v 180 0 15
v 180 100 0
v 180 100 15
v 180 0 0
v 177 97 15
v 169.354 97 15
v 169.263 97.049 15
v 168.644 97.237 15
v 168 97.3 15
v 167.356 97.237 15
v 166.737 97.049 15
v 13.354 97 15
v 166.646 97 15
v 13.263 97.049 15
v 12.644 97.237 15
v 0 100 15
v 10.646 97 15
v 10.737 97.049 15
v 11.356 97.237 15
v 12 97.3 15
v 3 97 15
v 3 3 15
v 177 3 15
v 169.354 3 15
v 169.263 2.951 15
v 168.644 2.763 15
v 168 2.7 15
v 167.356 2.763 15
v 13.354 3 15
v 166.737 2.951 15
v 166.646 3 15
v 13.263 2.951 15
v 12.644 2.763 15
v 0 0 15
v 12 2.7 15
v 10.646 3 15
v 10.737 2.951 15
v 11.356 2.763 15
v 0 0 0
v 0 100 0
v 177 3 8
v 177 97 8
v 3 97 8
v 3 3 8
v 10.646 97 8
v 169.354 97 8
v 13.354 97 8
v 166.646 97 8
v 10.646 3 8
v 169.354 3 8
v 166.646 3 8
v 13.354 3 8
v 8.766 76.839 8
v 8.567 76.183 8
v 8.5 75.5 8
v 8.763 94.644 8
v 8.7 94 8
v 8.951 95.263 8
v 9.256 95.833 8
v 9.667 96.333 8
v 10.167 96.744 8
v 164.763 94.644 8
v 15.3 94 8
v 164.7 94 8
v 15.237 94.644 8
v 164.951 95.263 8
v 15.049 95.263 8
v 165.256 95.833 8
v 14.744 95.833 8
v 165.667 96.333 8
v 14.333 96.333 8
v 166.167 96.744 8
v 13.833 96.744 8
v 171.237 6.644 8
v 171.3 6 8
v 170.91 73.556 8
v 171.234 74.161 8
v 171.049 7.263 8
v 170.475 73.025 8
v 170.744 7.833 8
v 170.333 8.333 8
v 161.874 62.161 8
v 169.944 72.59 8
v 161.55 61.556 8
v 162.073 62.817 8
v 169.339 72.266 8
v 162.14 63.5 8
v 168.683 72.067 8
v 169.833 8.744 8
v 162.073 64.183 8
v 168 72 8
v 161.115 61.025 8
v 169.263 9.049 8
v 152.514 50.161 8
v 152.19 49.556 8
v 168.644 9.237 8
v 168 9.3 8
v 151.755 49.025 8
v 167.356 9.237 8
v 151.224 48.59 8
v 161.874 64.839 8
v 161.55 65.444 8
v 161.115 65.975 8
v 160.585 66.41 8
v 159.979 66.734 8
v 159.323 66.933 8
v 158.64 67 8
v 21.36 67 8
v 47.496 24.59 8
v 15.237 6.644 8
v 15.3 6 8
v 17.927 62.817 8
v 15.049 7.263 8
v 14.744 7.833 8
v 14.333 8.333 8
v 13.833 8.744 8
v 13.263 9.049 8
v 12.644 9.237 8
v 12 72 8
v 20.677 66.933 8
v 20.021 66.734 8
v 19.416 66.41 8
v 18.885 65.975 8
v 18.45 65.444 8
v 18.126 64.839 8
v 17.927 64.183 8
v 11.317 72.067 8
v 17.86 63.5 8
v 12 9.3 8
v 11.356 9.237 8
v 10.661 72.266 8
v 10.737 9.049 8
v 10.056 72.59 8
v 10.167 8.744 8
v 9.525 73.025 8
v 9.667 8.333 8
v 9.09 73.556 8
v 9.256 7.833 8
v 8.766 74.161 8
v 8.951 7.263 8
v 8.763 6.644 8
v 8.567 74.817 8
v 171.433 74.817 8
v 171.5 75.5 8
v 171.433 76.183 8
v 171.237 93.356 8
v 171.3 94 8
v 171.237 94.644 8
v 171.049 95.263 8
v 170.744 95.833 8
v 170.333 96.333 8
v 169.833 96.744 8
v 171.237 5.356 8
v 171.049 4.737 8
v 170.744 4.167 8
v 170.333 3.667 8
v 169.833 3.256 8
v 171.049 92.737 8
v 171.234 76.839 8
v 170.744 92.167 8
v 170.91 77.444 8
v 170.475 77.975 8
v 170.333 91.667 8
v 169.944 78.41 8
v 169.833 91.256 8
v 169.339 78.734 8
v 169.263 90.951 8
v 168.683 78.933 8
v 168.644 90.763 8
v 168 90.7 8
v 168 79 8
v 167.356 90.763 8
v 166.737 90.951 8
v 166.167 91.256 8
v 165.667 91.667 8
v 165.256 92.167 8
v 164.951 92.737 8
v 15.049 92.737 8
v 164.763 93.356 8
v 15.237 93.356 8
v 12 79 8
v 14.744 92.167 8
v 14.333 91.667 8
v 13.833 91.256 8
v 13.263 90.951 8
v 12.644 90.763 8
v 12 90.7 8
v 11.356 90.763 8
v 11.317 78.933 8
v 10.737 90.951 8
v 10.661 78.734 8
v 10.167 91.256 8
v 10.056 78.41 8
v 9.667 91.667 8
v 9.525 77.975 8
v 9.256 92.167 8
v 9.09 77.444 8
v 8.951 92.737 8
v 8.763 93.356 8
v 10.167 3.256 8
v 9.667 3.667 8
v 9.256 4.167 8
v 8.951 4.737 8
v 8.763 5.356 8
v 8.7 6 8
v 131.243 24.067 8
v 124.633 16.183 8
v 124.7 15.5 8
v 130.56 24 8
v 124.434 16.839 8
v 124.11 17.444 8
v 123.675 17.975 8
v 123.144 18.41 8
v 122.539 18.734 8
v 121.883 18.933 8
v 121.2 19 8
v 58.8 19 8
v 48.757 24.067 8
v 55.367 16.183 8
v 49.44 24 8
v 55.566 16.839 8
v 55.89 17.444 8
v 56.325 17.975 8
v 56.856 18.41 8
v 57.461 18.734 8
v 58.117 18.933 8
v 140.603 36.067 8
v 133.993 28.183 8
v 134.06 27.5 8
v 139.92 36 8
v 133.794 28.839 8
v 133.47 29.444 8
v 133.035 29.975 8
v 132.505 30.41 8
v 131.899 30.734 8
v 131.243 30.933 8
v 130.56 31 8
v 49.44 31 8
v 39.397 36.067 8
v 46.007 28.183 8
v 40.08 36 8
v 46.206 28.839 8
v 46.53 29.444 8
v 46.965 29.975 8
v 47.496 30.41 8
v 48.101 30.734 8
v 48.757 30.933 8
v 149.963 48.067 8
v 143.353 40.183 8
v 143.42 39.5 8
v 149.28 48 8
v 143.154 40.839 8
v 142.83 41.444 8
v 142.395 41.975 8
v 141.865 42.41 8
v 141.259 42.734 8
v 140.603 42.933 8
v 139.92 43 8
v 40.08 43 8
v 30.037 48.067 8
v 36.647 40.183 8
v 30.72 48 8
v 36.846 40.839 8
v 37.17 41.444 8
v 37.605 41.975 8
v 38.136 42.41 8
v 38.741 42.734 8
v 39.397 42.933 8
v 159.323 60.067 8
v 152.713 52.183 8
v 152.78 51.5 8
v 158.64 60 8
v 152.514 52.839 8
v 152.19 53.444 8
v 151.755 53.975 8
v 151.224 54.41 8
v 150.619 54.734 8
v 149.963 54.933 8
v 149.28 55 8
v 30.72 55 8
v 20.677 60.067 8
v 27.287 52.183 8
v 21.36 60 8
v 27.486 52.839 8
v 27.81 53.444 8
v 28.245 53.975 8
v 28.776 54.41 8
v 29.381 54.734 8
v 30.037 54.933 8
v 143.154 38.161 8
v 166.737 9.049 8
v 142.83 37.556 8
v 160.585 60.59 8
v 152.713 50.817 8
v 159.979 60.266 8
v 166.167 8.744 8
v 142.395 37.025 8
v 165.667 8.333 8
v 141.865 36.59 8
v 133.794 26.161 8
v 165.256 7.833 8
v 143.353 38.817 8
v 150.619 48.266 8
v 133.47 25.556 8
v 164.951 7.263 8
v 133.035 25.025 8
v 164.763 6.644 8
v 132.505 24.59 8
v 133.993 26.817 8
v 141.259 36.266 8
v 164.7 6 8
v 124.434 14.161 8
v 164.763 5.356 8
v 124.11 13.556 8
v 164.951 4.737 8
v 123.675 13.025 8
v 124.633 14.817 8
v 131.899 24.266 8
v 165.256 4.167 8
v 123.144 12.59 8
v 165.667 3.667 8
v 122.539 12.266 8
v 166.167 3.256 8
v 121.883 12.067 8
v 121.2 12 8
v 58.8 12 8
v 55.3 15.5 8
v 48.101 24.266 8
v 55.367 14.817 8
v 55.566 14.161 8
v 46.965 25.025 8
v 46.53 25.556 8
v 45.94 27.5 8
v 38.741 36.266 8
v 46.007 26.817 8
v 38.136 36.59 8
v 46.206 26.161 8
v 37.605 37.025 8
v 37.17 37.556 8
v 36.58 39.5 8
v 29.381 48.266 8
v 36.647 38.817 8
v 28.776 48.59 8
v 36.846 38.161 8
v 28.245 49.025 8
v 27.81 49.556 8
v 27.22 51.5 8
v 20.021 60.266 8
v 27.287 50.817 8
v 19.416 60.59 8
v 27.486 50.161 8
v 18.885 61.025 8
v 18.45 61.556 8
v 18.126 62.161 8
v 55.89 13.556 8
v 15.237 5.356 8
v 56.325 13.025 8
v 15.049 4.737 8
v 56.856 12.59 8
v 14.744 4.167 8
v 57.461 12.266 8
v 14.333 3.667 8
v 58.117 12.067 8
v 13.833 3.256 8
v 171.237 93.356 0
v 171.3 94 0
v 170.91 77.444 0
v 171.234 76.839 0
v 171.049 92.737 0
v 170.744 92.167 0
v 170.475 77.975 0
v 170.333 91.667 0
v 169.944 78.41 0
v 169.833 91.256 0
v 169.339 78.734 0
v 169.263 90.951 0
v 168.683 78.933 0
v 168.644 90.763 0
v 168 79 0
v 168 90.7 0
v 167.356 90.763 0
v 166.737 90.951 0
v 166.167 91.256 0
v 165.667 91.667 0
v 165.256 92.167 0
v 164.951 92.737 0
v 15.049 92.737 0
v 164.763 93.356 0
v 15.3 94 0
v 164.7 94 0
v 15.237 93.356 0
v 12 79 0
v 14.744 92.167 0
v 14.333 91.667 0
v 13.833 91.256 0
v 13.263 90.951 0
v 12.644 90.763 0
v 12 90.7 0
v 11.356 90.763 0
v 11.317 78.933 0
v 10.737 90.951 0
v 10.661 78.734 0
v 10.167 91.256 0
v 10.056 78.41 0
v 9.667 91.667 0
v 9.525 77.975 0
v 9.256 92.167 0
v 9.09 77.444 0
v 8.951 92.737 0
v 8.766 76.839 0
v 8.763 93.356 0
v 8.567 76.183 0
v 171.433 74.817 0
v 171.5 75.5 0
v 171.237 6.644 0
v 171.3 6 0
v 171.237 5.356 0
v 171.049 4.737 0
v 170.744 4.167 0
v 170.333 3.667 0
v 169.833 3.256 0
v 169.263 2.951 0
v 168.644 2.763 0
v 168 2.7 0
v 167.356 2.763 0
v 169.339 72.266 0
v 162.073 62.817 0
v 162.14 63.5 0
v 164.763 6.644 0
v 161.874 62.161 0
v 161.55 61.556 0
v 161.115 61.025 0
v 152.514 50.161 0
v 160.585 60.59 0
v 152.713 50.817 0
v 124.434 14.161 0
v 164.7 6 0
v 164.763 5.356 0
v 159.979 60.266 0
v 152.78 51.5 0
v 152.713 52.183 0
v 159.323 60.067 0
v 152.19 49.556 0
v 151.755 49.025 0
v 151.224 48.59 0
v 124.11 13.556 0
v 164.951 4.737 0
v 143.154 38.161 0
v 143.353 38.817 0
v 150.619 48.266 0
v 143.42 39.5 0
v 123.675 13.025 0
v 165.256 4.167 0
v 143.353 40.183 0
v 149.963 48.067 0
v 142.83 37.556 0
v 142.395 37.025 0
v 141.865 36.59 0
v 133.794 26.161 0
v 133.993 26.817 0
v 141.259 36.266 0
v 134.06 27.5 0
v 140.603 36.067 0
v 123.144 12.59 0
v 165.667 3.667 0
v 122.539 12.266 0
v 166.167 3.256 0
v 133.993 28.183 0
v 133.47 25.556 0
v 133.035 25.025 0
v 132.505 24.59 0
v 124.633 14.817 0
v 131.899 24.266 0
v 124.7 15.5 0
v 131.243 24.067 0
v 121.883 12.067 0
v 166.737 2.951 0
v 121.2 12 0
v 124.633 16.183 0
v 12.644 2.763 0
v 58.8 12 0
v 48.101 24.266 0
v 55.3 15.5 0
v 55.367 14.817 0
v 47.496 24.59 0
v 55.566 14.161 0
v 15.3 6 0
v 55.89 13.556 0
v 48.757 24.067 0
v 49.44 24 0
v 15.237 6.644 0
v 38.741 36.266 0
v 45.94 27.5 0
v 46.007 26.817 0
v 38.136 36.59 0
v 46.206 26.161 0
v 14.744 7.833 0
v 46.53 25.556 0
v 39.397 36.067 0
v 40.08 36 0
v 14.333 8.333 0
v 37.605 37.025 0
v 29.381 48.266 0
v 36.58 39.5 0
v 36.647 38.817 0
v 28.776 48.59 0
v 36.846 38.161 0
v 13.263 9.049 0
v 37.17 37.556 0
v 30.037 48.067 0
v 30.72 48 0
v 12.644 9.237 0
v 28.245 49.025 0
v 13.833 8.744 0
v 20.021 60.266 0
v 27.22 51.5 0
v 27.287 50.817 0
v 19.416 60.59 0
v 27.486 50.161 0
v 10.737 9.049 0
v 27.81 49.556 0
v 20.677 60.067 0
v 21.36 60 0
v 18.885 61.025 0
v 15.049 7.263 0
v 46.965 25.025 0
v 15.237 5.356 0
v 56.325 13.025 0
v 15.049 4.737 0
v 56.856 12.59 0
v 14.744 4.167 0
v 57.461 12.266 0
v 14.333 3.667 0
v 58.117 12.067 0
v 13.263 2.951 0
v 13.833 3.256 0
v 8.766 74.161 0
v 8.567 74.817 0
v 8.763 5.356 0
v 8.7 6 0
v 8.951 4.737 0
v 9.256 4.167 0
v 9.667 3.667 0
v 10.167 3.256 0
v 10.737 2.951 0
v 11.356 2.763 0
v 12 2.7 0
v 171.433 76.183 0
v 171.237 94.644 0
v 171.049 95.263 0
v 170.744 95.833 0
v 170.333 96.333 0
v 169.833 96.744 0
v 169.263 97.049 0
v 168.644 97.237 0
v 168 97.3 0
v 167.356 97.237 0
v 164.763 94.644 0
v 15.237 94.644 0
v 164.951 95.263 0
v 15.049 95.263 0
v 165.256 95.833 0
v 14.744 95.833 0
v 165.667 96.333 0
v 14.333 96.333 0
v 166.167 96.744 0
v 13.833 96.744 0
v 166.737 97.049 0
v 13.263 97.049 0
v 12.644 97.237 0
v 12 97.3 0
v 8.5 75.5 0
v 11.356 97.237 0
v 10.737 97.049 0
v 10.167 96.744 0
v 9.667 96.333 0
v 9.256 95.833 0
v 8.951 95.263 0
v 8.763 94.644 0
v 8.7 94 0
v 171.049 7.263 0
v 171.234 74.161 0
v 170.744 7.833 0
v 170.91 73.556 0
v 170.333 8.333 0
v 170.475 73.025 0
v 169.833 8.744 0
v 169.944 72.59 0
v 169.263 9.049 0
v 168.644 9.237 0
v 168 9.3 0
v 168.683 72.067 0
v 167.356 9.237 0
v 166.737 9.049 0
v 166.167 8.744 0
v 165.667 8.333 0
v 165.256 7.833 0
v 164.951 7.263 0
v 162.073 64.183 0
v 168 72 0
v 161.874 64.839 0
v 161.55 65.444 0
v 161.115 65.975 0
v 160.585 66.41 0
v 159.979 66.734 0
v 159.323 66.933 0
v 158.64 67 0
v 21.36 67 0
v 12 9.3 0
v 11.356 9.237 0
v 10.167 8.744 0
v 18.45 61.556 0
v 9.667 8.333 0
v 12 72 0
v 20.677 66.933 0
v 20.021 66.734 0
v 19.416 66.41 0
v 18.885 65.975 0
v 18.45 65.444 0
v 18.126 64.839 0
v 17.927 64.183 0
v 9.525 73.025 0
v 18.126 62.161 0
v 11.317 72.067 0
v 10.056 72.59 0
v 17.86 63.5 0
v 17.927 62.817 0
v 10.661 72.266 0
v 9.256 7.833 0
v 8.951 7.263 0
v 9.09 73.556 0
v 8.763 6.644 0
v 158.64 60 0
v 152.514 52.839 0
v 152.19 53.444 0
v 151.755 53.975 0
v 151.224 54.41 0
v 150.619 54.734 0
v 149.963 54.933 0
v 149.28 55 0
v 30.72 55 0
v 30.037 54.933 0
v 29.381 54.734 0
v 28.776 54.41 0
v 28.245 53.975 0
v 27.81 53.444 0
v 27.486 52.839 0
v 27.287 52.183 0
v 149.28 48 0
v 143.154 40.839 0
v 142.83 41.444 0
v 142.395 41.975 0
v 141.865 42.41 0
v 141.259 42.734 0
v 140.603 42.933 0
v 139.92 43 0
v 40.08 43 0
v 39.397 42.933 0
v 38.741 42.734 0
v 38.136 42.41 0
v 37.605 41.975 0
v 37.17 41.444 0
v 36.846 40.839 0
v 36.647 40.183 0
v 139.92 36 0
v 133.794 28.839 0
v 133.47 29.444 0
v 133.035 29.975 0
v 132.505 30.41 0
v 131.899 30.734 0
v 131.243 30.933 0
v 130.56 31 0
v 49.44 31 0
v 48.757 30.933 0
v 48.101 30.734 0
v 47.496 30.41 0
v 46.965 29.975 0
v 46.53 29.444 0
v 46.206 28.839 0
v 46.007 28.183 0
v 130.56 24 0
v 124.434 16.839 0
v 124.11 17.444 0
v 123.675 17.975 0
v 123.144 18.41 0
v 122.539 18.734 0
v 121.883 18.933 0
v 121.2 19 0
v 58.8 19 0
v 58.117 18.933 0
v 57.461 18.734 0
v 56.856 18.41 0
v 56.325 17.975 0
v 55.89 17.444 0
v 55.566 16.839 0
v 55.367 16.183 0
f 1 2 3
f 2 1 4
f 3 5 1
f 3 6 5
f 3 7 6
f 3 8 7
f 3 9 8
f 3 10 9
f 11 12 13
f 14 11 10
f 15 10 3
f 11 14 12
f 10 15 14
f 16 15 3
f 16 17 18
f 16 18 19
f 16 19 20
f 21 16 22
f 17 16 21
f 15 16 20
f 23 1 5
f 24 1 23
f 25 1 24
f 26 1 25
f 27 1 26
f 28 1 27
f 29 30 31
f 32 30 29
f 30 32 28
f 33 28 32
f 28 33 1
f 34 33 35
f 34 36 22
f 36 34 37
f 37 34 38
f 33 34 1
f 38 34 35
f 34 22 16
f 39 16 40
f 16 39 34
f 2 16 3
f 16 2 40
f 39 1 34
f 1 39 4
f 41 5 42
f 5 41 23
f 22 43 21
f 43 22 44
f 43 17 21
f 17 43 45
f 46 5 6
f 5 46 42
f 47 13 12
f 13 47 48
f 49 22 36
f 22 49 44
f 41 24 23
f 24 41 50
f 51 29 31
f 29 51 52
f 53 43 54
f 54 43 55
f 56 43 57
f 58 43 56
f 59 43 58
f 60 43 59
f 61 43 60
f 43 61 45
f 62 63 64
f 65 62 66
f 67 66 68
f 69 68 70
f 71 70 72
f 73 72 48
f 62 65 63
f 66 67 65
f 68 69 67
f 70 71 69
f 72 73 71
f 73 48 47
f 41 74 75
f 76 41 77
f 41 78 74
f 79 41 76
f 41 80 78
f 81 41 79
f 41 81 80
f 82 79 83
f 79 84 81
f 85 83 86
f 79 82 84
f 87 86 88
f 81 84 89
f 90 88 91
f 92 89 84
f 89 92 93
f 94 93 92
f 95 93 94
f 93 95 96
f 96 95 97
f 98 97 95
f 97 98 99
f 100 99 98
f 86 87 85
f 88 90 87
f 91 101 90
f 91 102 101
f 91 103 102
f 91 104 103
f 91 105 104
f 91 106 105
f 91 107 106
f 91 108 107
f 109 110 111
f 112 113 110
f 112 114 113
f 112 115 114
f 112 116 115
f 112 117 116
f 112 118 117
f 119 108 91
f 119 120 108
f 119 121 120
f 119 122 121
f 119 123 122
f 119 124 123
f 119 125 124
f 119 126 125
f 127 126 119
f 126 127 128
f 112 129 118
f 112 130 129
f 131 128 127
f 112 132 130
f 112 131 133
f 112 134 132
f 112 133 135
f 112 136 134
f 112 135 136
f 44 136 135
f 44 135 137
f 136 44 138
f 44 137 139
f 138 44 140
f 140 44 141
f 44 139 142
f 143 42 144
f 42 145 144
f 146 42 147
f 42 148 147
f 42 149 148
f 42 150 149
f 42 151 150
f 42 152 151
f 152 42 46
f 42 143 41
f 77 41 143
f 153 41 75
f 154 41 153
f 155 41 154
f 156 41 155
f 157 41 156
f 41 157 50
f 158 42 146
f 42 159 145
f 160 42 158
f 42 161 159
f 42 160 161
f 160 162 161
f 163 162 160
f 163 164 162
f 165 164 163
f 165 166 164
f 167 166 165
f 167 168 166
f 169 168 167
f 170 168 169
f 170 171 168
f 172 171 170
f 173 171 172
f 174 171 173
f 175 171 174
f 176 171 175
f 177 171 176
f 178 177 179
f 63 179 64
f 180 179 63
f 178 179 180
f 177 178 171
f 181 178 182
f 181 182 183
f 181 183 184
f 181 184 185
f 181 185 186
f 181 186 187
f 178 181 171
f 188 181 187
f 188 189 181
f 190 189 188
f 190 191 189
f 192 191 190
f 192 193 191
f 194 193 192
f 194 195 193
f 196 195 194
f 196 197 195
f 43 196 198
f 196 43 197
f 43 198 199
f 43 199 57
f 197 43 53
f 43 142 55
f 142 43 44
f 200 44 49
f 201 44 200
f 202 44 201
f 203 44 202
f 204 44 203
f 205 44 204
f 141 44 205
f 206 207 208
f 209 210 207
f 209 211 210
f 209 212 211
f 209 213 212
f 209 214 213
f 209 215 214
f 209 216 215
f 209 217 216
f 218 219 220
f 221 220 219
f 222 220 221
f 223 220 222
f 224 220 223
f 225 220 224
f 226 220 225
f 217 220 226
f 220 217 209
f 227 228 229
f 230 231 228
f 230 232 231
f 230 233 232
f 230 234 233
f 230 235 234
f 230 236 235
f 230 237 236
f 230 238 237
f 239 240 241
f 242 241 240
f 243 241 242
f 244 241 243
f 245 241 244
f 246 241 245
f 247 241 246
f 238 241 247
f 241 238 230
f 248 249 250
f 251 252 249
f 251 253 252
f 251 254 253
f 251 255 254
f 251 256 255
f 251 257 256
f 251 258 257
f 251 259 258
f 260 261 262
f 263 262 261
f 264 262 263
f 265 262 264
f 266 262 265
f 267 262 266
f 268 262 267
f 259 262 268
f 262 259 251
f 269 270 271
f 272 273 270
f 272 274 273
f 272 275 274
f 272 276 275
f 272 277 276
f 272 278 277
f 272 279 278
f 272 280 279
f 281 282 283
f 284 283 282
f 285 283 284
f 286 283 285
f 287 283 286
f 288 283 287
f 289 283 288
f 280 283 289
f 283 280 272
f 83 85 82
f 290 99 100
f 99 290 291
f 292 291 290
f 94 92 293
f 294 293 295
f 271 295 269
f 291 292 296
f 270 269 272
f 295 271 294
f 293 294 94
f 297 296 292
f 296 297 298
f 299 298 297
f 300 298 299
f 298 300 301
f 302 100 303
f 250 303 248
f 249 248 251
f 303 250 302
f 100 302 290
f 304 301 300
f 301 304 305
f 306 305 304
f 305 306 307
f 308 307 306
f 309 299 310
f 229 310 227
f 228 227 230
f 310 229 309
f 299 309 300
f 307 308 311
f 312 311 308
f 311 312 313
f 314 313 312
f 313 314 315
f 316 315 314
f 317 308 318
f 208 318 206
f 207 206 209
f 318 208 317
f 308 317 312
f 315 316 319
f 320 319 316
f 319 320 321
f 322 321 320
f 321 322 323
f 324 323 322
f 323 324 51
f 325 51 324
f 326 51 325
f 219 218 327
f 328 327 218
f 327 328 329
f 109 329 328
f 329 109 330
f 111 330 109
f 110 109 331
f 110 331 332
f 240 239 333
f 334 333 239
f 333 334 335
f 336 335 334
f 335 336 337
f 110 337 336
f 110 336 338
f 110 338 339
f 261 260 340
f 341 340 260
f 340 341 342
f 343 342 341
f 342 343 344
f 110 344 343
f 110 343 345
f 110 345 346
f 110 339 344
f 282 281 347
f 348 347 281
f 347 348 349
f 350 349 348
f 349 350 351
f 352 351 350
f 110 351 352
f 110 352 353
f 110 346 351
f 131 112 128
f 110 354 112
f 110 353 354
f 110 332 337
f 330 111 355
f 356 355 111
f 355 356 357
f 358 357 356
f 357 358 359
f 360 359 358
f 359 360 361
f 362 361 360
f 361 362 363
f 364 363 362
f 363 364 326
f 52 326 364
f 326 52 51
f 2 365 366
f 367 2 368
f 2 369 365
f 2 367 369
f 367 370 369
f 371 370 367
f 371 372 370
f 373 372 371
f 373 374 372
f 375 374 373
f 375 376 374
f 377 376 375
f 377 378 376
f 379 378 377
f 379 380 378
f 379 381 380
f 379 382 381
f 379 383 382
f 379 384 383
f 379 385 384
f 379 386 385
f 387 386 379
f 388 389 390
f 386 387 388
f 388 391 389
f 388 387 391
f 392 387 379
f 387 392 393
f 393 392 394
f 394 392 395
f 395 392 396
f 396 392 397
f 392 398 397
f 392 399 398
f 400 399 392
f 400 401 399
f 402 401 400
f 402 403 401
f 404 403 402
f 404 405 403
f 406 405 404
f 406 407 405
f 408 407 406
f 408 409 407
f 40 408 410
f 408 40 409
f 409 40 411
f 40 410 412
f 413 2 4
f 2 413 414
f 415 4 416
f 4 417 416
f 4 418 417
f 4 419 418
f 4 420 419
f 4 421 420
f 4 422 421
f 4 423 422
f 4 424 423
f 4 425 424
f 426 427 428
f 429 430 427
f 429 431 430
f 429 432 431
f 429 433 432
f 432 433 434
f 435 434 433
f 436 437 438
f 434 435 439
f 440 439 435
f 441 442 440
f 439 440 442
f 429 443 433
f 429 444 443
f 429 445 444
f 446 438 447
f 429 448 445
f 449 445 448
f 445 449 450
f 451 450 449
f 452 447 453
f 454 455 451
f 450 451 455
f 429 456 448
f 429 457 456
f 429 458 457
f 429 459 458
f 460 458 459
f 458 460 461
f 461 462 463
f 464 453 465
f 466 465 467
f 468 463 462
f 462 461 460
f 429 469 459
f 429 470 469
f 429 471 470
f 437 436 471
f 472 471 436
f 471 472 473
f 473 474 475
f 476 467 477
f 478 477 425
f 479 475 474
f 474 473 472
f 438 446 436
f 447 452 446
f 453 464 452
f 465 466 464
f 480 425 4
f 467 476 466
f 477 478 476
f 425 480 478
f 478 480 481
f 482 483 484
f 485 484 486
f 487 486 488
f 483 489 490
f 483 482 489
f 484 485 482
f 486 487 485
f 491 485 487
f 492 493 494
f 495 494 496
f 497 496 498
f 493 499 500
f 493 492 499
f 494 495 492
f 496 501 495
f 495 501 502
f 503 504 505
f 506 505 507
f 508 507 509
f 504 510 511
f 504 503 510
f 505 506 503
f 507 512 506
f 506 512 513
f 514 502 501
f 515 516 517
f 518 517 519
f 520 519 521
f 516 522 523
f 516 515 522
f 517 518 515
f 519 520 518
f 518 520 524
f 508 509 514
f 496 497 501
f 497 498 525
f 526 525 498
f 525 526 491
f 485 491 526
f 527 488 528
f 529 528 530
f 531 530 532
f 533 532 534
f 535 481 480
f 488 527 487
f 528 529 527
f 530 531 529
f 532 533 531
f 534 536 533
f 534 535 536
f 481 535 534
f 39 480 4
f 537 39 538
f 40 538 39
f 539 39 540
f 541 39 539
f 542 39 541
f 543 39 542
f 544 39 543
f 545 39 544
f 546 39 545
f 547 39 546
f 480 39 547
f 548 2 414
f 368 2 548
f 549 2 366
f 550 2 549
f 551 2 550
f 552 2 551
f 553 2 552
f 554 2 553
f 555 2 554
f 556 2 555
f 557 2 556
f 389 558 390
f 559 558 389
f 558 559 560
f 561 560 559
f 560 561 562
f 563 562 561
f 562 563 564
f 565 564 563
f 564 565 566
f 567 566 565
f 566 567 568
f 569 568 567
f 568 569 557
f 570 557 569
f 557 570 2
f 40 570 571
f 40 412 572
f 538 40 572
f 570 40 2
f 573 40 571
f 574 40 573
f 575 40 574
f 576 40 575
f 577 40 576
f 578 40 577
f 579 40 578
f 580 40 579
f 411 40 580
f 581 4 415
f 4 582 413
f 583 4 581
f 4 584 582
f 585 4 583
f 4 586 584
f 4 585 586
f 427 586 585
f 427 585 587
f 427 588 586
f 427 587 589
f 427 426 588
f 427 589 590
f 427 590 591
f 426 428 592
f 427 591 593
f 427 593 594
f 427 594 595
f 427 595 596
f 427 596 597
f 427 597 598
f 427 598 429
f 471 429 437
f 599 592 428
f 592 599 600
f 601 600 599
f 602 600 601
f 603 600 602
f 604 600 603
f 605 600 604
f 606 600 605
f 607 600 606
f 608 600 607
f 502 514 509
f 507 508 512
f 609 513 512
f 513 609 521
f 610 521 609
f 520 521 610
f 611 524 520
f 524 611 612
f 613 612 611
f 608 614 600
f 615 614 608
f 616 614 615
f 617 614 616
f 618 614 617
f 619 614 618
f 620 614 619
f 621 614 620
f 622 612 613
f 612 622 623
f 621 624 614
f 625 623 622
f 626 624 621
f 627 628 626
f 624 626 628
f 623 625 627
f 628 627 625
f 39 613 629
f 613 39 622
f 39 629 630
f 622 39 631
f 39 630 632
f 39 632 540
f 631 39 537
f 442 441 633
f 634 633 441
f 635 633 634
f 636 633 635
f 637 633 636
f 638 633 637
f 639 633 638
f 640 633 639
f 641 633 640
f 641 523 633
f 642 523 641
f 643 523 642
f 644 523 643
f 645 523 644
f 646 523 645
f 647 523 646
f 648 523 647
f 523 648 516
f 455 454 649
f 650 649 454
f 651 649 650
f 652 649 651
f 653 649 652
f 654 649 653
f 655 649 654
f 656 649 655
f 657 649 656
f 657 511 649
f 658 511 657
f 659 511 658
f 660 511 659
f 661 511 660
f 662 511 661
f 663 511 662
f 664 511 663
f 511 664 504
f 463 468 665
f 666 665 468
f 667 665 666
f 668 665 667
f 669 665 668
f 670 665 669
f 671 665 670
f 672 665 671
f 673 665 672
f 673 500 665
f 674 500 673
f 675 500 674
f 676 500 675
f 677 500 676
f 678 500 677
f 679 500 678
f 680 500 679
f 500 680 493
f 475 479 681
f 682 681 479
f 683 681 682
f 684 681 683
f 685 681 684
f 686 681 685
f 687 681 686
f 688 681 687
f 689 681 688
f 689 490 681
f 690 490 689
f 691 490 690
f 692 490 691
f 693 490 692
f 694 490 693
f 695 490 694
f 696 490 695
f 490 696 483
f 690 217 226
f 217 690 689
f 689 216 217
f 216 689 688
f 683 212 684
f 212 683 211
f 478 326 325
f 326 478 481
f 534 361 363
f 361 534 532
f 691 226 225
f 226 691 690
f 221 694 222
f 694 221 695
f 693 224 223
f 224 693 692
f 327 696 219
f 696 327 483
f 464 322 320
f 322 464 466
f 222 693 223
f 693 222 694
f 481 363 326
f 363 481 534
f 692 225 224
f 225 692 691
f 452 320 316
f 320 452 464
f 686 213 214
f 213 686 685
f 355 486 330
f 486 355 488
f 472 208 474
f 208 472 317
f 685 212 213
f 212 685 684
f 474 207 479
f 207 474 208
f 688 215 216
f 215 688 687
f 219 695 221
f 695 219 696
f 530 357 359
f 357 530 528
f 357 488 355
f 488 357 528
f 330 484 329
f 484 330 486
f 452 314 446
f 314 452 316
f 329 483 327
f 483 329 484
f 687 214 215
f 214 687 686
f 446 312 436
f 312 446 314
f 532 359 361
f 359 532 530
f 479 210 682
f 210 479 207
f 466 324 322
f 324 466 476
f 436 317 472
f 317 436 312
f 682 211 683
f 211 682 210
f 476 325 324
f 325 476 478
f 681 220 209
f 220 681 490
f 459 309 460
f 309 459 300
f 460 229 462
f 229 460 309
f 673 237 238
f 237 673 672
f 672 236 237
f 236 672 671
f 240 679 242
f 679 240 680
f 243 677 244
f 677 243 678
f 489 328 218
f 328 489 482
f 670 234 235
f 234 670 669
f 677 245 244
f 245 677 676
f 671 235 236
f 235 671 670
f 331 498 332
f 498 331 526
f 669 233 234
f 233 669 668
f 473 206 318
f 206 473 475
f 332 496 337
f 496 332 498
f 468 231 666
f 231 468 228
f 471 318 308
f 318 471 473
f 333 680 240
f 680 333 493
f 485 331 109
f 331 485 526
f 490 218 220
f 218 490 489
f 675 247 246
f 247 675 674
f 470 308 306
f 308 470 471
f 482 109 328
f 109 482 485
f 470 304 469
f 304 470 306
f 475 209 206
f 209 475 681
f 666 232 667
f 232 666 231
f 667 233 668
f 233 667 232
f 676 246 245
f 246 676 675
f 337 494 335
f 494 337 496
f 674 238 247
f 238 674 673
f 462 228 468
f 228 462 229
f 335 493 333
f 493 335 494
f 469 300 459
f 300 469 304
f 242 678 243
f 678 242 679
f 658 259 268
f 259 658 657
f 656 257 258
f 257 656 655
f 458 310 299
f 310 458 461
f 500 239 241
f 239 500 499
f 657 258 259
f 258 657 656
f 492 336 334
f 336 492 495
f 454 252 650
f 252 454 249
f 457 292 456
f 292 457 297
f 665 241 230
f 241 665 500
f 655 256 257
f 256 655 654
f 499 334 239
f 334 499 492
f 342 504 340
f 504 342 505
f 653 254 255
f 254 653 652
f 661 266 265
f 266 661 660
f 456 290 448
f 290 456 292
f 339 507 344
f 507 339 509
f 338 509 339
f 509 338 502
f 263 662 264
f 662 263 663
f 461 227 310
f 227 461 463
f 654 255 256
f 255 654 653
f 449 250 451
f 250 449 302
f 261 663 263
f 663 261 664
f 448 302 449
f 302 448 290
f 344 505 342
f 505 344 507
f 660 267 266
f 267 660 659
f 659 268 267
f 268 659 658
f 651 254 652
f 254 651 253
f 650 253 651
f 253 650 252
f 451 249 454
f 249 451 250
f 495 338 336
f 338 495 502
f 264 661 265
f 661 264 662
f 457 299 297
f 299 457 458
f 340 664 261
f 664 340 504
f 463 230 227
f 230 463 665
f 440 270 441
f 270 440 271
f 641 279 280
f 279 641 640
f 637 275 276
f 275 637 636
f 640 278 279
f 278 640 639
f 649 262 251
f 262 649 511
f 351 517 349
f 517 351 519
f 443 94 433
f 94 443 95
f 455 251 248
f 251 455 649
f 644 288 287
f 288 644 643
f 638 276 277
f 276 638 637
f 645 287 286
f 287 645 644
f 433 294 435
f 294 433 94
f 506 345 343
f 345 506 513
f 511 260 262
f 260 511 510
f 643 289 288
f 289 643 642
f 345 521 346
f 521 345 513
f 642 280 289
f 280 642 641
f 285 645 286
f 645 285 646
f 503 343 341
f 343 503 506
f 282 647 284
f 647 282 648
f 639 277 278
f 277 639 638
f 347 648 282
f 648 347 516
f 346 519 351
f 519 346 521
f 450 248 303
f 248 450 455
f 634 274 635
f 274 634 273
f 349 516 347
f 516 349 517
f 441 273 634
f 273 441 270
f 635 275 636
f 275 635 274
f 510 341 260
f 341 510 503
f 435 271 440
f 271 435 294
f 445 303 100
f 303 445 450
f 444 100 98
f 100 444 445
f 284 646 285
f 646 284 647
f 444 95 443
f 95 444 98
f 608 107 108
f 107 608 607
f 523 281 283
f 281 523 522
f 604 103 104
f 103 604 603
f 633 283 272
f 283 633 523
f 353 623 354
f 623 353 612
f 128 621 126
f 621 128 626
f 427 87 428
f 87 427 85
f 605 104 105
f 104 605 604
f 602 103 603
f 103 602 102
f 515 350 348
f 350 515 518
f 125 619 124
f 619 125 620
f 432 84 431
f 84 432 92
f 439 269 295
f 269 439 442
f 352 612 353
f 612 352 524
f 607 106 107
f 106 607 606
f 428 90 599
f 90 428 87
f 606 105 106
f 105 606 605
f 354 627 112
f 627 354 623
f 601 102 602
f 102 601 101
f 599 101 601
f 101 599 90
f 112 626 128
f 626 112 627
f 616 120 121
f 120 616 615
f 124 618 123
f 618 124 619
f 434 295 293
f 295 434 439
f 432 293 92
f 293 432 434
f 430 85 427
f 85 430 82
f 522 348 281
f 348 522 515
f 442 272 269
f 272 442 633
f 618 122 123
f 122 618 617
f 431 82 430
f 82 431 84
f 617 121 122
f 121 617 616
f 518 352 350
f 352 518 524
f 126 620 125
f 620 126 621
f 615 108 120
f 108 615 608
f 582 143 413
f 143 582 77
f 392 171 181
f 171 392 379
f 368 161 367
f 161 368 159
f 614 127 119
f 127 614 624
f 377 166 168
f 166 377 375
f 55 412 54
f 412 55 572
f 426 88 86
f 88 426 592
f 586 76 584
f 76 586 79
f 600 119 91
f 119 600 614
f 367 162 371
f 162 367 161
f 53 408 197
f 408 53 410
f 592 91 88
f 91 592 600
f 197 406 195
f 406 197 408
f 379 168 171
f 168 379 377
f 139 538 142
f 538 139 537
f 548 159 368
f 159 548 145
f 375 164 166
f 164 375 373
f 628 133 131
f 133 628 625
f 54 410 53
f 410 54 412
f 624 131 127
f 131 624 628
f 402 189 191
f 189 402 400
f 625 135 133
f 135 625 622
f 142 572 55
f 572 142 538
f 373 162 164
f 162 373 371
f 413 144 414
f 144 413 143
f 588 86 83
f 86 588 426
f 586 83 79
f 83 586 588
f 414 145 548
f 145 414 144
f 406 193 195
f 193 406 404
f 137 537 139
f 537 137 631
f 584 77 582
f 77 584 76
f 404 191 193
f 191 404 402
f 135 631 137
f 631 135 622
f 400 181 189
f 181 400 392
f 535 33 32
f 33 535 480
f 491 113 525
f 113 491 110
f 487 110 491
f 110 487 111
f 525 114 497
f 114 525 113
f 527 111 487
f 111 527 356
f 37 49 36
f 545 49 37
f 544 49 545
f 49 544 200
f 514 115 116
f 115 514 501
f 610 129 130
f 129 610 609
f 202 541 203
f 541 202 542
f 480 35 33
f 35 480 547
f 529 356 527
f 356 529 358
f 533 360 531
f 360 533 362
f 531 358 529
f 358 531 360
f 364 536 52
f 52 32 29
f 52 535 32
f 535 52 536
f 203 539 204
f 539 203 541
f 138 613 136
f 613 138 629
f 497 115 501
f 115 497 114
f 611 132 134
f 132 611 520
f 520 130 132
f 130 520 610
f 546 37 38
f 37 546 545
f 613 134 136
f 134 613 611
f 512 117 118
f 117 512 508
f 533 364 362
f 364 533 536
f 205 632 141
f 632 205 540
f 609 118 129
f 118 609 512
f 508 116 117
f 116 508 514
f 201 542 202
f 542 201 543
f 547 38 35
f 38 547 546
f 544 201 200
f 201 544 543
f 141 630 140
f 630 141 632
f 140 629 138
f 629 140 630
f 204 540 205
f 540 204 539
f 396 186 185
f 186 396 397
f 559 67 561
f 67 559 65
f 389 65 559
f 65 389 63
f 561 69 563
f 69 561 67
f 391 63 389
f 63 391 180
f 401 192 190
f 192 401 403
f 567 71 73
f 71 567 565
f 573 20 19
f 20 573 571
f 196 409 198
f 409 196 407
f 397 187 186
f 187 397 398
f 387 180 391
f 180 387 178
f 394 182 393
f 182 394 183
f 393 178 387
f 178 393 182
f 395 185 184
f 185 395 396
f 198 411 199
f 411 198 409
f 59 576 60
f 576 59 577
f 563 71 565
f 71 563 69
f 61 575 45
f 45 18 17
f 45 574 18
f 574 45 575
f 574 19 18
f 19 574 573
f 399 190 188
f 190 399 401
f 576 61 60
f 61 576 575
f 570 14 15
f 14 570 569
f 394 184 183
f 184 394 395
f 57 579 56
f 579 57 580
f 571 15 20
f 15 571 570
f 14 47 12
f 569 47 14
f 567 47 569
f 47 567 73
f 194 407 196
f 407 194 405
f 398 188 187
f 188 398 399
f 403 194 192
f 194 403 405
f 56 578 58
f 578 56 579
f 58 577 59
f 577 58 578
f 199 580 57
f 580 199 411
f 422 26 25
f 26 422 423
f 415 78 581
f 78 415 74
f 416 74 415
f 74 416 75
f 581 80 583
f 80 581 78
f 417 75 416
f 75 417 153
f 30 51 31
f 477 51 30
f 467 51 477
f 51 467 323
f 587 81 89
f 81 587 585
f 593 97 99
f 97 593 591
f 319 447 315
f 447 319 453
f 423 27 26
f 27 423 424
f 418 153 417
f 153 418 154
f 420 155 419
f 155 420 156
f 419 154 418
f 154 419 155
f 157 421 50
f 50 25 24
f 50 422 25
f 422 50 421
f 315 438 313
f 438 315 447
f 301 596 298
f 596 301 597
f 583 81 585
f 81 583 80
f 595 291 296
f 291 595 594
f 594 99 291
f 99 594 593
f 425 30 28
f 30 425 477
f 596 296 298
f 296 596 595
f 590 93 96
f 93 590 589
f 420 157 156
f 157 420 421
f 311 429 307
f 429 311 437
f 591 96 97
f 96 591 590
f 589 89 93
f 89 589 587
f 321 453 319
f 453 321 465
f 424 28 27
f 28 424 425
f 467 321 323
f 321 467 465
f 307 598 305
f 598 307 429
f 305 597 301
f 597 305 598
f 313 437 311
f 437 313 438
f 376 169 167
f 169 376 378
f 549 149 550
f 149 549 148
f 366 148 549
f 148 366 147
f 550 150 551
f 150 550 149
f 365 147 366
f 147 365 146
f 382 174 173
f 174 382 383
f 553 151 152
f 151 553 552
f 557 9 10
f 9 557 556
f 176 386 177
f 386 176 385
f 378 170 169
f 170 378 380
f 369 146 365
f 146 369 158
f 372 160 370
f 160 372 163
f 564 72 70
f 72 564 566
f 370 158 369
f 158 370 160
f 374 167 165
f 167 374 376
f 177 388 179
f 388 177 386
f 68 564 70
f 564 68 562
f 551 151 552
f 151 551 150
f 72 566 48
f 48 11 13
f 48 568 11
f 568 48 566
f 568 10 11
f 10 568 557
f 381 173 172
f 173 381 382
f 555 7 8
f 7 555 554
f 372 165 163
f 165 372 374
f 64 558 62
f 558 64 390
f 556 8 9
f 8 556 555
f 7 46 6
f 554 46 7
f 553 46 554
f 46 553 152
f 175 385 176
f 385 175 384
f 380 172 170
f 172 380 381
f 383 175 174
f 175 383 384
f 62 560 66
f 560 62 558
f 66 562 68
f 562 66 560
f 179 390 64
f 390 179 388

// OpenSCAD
$fn = 32;

// ----------------------------------------------------------------------
// Slotted panel: 180 x 100 mm, 6 рядов of slots
// ----------------------------------------------------------------------

// --- parameters (mm) ---
panel_w = 180;            // panel width
panel_d = 100;            // panel depth
thick = 8;                // panel thickness
slot_w = 7;               // slot width
pitch0 = 12;              // first row pitch
pitch_step = 2.4;         // pitch increase per row
margin = 12;              // margin around the slot field
rows = 6;                 // number of slot rows
mount_d = 6.6;            // mounting holes
mount_x = 78;             // mounting hole offset
rim_h = 15;               // rim height
rim_t = 3;                // rim wall thickness

difference() {
  union() {
    cube([panel_w, panel_d, thick]);
    translate([0, 0, thick - 1]) difference() {
      cube([panel_w, panel_d, rim_h - thick + 1]);
      translate([rim_t, rim_t, -2.5]) cube([panel_w - 2 * rim_t, panel_d - 2 * rim_t, rim_h - thick + 6]);
    }
  }
  /* slot rows: stadium shaped cutters, 2.5 mm clear of both faces */
  /* row 0: pitch 12, length 62.4 */
  hull() {
    translate([58.8, 15.5, -2.5]) cylinder(h = thick + 5, d = slot_w);
    translate([121.2, 15.5, -2.5]) cylinder(h = thick + 5, d = slot_w);
  }
  /* row 1: pitch 12, length 81.12 */
  hull() {
    translate([49.44, 27.5, -2.5]) cylinder(h = thick + 5, d = slot_w);
    translate([130.56, 27.5, -2.5]) cylinder(h = thick + 5, d = slot_w);
  }
  /* row 2: pitch 12, length 99.84 */
  hull() {
    translate([40.08, 39.5, -2.5]) cylinder(h = thick + 5, d = slot_w);
    translate([139.92, 39.5, -2.5]) cylinder(h = thick + 5, d = slot_w);
  }
  /* row 3: pitch 12, length 118.56 */
  hull() {
    translate([30.72, 51.5, -2.5]) cylinder(h = thick + 5, d = slot_w);
    translate([149.28, 51.5, -2.5]) cylinder(h = thick + 5, d = slot_w);
  }
  /* row 4: pitch 12, length 137.28 */
  hull() {
    translate([21.36, 63.5, -2.5]) cylinder(h = thick + 5, d = slot_w);
    translate([158.64, 63.5, -2.5]) cylinder(h = thick + 5, d = slot_w);
  }
  /* row 5: pitch 12, length 156 */
  hull() {
    translate([12, 75.5, -2.5]) cylinder(h = thick + 5, d = slot_w);
    translate([168, 75.5, -2.5]) cylinder(h = thick + 5, d = slot_w);
  }
  translate([12, 6, -2.5]) cylinder(h = 20, d = mount_d);
  translate([12, 94, -2.5]) cylinder(h = 20, d = mount_d);
  translate([168, 6, -2.5]) cylinder(h = 20, d = mount_d);
  translate([168, 94, -2.5]) cylinder(h = 20, d = mount_d);
}
